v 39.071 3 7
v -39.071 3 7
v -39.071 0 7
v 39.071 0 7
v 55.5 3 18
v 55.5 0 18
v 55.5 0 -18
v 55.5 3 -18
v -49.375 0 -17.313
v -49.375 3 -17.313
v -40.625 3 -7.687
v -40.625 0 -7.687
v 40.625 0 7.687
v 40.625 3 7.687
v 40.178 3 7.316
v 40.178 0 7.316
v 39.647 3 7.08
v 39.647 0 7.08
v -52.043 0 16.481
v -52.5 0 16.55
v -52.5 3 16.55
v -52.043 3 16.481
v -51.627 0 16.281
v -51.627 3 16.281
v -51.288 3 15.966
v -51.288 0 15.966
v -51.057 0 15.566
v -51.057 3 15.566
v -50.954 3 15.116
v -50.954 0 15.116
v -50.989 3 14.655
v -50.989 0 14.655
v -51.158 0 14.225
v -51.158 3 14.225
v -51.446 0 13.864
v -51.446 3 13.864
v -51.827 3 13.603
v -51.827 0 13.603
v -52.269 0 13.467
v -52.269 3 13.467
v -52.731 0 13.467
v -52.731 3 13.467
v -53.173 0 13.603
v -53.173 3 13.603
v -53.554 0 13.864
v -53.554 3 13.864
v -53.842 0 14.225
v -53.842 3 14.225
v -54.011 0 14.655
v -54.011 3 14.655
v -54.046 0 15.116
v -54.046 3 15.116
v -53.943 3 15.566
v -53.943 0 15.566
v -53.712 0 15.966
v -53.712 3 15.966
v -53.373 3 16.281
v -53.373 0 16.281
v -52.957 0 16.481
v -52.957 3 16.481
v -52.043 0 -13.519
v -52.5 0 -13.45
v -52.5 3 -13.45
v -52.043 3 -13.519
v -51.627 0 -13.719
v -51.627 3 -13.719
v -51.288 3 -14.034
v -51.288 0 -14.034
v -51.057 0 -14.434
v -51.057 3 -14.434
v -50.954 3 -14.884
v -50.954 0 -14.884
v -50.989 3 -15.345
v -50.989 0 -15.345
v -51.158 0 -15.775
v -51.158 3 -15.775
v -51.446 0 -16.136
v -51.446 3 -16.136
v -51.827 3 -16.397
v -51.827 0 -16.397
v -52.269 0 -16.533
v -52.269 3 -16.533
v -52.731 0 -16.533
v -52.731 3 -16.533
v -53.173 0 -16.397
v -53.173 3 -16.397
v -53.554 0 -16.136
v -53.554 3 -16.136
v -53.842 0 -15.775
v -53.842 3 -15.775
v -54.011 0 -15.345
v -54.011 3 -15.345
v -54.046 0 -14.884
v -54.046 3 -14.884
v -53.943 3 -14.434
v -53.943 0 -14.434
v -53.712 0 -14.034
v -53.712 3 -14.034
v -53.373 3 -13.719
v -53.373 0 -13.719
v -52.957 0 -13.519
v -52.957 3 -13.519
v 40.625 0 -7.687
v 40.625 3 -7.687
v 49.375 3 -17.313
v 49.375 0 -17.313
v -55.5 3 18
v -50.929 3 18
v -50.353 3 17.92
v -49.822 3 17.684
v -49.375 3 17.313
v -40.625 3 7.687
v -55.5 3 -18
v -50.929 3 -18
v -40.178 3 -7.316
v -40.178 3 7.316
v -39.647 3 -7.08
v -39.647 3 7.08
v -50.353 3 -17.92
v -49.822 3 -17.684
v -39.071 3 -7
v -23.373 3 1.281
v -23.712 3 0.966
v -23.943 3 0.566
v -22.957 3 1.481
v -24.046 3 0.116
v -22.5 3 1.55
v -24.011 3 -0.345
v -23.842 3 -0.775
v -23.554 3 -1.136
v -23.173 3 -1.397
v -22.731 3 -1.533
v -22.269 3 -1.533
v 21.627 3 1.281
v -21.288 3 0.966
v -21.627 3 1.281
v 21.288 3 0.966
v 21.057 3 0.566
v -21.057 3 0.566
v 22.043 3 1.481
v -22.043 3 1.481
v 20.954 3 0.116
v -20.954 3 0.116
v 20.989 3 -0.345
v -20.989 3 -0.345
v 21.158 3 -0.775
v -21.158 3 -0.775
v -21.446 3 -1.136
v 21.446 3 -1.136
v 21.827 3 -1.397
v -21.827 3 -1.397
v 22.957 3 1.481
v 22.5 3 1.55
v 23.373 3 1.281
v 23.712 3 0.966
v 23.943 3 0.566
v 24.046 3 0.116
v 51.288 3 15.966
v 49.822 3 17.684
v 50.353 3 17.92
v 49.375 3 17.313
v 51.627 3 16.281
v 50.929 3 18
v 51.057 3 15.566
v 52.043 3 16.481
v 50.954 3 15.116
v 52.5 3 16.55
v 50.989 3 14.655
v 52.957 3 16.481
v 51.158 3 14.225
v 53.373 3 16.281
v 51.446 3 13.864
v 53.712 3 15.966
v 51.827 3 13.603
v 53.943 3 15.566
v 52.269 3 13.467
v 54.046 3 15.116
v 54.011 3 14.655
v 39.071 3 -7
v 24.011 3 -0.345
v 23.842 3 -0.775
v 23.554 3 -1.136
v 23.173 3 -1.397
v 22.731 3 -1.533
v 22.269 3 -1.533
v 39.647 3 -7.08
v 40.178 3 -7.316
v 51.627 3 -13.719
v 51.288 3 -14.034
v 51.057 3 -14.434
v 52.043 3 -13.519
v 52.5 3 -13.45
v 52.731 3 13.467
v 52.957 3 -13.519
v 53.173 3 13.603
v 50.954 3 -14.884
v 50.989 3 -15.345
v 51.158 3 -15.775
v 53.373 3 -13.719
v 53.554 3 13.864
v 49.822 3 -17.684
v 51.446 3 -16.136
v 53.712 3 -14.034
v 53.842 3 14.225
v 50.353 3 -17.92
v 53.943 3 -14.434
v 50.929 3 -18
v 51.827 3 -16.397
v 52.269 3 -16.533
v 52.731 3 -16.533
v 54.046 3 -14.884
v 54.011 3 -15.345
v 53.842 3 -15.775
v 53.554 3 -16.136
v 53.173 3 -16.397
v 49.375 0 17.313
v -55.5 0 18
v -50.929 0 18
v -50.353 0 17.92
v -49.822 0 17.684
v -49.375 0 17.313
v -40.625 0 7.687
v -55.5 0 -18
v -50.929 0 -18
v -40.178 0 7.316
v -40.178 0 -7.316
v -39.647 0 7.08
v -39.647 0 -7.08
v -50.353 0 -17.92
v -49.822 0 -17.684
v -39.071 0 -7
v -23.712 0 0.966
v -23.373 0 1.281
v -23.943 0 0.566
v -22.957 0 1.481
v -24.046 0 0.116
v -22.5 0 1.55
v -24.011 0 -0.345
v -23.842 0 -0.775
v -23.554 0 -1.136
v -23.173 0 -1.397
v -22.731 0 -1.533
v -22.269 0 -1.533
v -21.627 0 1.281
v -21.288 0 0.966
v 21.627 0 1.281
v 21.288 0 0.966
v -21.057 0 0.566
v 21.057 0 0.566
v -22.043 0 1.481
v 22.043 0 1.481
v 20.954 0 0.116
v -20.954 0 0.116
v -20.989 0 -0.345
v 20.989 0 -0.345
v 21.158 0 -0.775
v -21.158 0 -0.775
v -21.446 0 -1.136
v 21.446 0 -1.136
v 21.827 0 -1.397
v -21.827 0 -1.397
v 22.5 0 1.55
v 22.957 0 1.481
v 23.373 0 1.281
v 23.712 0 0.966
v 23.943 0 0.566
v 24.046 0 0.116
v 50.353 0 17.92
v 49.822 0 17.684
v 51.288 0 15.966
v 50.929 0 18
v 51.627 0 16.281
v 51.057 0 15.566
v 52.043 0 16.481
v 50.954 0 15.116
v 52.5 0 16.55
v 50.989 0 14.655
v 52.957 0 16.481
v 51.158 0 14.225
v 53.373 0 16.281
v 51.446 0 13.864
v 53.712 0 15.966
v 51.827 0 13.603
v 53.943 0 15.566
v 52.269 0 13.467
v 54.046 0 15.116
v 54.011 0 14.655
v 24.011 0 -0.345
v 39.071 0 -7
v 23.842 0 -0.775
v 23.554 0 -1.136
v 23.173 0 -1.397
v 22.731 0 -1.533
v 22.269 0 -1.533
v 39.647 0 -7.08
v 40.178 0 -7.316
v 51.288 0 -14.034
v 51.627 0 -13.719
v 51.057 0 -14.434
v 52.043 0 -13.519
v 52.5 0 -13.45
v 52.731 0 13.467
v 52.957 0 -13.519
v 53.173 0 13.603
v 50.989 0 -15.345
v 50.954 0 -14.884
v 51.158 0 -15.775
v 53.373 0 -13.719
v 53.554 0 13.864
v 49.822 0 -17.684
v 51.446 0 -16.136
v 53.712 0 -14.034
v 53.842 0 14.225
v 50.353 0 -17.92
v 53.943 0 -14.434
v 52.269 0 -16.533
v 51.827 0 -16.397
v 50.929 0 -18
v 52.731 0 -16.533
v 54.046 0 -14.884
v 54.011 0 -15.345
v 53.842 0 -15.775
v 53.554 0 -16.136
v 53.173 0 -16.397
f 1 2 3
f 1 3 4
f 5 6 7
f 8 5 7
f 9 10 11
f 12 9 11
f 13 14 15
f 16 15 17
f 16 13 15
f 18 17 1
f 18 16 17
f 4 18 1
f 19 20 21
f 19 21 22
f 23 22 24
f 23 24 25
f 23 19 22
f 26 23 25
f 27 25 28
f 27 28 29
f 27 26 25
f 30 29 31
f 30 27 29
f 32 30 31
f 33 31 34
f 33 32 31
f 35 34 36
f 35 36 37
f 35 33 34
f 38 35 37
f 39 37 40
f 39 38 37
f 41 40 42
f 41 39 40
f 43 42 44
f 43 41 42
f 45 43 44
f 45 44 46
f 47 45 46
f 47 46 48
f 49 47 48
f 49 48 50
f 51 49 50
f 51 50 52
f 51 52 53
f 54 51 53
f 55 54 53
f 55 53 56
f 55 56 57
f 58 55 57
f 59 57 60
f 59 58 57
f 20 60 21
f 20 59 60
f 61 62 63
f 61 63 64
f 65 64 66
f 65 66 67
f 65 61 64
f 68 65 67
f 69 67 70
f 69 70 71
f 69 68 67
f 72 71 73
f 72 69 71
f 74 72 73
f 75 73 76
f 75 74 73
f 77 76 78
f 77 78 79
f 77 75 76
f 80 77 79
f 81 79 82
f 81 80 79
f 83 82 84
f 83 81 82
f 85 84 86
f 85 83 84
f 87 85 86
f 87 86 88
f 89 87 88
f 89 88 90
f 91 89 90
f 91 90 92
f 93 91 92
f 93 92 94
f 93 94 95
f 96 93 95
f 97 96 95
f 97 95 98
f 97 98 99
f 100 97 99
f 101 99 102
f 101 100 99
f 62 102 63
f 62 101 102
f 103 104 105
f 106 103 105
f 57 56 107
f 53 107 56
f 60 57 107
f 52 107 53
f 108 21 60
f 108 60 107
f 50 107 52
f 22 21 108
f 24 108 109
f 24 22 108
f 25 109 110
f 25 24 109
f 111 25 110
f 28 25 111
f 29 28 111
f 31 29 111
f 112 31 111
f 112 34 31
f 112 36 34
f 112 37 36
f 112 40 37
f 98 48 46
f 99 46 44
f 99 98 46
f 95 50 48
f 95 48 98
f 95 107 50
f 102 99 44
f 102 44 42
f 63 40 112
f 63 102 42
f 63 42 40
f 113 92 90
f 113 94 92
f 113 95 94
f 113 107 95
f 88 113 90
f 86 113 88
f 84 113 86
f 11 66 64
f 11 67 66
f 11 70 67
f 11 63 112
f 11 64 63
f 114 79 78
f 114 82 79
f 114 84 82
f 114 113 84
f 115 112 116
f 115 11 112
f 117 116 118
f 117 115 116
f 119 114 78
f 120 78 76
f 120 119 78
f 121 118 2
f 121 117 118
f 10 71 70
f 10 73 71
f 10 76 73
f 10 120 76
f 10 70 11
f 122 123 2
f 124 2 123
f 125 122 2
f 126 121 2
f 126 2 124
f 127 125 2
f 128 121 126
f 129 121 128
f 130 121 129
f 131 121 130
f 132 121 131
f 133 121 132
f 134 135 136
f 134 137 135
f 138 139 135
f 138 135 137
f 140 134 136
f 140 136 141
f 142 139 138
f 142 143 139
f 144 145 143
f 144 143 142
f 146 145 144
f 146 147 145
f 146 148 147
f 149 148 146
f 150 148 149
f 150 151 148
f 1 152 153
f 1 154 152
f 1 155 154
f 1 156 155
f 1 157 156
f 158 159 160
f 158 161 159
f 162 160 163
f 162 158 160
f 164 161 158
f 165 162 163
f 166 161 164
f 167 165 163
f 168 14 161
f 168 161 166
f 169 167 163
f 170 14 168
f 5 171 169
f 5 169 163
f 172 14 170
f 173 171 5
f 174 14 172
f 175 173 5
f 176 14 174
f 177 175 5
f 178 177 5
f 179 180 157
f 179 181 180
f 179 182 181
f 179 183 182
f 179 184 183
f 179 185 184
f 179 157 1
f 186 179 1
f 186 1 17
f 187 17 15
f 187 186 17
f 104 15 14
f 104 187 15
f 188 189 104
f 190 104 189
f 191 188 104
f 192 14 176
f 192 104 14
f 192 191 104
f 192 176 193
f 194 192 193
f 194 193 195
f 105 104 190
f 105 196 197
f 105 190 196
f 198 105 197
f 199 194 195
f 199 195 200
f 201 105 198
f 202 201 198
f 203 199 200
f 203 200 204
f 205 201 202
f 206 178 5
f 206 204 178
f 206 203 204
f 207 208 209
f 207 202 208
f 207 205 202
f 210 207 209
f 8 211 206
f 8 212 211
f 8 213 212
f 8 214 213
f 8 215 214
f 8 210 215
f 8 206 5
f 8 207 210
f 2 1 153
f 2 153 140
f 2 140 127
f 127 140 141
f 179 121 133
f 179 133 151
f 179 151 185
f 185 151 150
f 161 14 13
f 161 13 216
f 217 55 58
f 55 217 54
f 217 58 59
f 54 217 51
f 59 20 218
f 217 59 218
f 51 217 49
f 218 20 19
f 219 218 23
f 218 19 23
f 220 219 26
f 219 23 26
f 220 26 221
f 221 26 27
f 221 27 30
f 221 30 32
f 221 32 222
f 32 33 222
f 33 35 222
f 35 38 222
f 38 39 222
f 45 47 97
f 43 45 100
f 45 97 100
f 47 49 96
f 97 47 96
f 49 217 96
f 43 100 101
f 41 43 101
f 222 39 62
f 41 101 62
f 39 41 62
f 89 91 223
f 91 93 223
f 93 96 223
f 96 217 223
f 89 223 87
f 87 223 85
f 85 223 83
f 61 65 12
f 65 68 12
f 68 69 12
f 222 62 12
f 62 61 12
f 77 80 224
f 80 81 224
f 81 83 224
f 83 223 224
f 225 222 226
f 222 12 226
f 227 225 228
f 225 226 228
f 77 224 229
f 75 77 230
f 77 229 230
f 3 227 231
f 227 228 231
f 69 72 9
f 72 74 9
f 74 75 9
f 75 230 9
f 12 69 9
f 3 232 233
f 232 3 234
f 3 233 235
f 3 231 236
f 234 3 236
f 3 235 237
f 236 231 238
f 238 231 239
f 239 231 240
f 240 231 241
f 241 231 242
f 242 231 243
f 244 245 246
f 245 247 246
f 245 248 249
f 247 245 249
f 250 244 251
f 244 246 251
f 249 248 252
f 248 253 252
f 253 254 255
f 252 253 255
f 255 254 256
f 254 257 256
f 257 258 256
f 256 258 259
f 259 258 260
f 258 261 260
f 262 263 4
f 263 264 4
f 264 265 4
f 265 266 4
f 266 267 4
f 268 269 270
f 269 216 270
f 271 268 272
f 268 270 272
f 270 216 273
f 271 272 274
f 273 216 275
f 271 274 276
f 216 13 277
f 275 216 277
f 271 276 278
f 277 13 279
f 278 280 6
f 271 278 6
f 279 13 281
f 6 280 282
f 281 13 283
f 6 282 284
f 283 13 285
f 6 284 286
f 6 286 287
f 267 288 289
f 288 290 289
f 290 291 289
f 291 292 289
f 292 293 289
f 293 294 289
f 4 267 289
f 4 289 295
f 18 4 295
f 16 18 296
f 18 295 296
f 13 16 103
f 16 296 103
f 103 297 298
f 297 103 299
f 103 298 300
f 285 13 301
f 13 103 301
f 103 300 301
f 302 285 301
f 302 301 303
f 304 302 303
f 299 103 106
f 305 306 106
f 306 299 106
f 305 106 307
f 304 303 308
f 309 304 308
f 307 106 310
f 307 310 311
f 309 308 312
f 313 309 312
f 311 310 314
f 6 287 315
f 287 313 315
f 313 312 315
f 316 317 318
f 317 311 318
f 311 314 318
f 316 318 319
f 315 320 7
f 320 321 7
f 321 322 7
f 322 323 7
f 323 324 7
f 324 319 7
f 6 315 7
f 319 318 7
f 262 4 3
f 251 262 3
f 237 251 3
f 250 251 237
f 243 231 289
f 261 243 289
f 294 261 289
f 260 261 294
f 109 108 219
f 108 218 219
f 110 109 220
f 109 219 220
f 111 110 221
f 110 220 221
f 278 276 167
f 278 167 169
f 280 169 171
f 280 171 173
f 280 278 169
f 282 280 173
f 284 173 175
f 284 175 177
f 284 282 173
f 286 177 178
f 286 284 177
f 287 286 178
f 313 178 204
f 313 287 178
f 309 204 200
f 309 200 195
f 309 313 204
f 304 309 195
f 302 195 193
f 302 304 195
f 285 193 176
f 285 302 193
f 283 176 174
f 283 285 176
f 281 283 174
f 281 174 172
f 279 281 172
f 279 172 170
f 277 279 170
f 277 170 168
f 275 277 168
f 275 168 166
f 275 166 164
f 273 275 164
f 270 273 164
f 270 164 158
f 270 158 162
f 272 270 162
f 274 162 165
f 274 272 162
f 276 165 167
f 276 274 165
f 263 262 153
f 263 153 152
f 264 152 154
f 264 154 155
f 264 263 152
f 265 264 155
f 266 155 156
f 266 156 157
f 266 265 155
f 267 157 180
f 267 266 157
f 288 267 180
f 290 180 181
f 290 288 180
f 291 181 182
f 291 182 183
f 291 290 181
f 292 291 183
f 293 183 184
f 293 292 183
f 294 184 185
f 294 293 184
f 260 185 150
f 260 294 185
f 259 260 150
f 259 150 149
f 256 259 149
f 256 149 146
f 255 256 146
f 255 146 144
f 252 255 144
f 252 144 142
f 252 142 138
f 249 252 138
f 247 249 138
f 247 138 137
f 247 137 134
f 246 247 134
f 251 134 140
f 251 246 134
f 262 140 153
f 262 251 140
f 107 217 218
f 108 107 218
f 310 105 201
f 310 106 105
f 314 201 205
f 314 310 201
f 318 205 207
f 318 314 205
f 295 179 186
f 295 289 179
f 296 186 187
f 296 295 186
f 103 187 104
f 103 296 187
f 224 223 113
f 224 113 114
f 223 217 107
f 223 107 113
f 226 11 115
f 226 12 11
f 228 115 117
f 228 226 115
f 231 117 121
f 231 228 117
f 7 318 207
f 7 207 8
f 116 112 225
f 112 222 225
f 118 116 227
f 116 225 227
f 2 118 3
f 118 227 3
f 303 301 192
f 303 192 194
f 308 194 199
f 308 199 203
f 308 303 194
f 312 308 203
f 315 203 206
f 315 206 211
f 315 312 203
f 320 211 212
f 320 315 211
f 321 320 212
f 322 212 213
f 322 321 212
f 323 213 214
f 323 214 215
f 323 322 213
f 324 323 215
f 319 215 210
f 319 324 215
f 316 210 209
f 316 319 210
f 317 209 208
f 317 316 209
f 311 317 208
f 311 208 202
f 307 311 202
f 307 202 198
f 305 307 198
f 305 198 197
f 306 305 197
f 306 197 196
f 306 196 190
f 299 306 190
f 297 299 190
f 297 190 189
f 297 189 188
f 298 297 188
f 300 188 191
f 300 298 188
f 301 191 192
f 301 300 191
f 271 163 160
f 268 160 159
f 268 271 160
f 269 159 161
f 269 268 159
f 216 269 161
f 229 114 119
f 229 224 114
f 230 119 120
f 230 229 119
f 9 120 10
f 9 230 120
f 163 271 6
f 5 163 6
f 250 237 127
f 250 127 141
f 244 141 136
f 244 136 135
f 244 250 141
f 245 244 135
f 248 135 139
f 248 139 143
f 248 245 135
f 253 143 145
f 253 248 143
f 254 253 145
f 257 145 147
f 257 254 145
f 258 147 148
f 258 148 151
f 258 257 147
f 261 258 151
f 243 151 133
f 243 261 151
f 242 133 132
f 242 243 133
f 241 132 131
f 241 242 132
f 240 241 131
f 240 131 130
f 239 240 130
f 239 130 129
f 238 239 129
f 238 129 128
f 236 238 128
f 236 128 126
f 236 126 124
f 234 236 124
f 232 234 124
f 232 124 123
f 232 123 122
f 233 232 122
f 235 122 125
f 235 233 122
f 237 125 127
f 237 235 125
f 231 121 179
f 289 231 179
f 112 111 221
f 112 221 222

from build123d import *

# Parameters (mm, degrees)
SKETCH_1_W          = 111
SKETCH_1_H          = 36
SKETCH_1_R          = 1.55
EXTRUDE_1_DEPTH     = 3
CUT_EXTRUDE_1_DEPTH = 59.423026282
FILLET_2_R          = 2.1


with BuildPart() as part:
    # ｽｹｯﾁ1 → ﾎﾞｽ - 押し出し1 (new body)
    with BuildSketch(Plane(origin=(0, 0, 0), x_dir=(1, 0, 0), z_dir=(0, 1, 0))):
        Rectangle(SKETCH_1_W, SKETCH_1_H)
        with Locations(Location((-52.5, 15, 0), (0, 0, 270))):
            Circle(SKETCH_1_R, mode=Mode.SUBTRACT)
        with Locations(Location((-52.5, -15, 0), (0, 0, 270))):
            Circle(SKETCH_1_R, mode=Mode.SUBTRACT)
        with Locations(Location((52.5, -15, 0), (0, 0, 270))):
            Circle(SKETCH_1_R, mode=Mode.SUBTRACT)
        with Locations(Location((52.5, 15, 0), (0, 0, 270))):
            Circle(SKETCH_1_R, mode=Mode.SUBTRACT)
        with Locations(Location((-22.5, 0, 0), (0, 0, 270))):
            Circle(SKETCH_1_R, mode=Mode.SUBTRACT)
        with Locations(Location((22.5, 0, 0), (0, 0, 270))):
            Circle(SKETCH_1_R, mode=Mode.SUBTRACT)
    extrude(amount=EXTRUDE_1_DEPTH)

    # ｽｹｯﾁ2 → ｶｯﾄ - 押し出し1 (cut, through all)
    with BuildSketch(Plane(origin=(0, 3, 0), x_dir=(1, 0, 0), z_dir=(0, 1, 0))):
        Polygon((-50, 18), (-40, 7), (40, 7), (50, 18), align=None)
        Polygon((50, -18), (-50, -18), (-40, -7), (40, -7), align=None)
    extrude(amount=-CUT_EXTRUDE_1_DEPTH, mode=Mode.SUBTRACT)

    # ﾌｨﾚｯﾄ2
    fillet_2_edges = [part.edges().sort_by_distance(p)[0] for p in [
        (-50, 1.5, -18),
        (50, 1.5, -18),
        (40, 1.5, -7),
        (-40, 1.5, -7),
        (40, 1.5, 7),
        (50, 1.5, 18),
        (-50, 1.5, 18),
        (-40, 1.5, 7),
    ]]
    fillet(fillet_2_edges, radius=FILLET_2_R)


solid = part.part
